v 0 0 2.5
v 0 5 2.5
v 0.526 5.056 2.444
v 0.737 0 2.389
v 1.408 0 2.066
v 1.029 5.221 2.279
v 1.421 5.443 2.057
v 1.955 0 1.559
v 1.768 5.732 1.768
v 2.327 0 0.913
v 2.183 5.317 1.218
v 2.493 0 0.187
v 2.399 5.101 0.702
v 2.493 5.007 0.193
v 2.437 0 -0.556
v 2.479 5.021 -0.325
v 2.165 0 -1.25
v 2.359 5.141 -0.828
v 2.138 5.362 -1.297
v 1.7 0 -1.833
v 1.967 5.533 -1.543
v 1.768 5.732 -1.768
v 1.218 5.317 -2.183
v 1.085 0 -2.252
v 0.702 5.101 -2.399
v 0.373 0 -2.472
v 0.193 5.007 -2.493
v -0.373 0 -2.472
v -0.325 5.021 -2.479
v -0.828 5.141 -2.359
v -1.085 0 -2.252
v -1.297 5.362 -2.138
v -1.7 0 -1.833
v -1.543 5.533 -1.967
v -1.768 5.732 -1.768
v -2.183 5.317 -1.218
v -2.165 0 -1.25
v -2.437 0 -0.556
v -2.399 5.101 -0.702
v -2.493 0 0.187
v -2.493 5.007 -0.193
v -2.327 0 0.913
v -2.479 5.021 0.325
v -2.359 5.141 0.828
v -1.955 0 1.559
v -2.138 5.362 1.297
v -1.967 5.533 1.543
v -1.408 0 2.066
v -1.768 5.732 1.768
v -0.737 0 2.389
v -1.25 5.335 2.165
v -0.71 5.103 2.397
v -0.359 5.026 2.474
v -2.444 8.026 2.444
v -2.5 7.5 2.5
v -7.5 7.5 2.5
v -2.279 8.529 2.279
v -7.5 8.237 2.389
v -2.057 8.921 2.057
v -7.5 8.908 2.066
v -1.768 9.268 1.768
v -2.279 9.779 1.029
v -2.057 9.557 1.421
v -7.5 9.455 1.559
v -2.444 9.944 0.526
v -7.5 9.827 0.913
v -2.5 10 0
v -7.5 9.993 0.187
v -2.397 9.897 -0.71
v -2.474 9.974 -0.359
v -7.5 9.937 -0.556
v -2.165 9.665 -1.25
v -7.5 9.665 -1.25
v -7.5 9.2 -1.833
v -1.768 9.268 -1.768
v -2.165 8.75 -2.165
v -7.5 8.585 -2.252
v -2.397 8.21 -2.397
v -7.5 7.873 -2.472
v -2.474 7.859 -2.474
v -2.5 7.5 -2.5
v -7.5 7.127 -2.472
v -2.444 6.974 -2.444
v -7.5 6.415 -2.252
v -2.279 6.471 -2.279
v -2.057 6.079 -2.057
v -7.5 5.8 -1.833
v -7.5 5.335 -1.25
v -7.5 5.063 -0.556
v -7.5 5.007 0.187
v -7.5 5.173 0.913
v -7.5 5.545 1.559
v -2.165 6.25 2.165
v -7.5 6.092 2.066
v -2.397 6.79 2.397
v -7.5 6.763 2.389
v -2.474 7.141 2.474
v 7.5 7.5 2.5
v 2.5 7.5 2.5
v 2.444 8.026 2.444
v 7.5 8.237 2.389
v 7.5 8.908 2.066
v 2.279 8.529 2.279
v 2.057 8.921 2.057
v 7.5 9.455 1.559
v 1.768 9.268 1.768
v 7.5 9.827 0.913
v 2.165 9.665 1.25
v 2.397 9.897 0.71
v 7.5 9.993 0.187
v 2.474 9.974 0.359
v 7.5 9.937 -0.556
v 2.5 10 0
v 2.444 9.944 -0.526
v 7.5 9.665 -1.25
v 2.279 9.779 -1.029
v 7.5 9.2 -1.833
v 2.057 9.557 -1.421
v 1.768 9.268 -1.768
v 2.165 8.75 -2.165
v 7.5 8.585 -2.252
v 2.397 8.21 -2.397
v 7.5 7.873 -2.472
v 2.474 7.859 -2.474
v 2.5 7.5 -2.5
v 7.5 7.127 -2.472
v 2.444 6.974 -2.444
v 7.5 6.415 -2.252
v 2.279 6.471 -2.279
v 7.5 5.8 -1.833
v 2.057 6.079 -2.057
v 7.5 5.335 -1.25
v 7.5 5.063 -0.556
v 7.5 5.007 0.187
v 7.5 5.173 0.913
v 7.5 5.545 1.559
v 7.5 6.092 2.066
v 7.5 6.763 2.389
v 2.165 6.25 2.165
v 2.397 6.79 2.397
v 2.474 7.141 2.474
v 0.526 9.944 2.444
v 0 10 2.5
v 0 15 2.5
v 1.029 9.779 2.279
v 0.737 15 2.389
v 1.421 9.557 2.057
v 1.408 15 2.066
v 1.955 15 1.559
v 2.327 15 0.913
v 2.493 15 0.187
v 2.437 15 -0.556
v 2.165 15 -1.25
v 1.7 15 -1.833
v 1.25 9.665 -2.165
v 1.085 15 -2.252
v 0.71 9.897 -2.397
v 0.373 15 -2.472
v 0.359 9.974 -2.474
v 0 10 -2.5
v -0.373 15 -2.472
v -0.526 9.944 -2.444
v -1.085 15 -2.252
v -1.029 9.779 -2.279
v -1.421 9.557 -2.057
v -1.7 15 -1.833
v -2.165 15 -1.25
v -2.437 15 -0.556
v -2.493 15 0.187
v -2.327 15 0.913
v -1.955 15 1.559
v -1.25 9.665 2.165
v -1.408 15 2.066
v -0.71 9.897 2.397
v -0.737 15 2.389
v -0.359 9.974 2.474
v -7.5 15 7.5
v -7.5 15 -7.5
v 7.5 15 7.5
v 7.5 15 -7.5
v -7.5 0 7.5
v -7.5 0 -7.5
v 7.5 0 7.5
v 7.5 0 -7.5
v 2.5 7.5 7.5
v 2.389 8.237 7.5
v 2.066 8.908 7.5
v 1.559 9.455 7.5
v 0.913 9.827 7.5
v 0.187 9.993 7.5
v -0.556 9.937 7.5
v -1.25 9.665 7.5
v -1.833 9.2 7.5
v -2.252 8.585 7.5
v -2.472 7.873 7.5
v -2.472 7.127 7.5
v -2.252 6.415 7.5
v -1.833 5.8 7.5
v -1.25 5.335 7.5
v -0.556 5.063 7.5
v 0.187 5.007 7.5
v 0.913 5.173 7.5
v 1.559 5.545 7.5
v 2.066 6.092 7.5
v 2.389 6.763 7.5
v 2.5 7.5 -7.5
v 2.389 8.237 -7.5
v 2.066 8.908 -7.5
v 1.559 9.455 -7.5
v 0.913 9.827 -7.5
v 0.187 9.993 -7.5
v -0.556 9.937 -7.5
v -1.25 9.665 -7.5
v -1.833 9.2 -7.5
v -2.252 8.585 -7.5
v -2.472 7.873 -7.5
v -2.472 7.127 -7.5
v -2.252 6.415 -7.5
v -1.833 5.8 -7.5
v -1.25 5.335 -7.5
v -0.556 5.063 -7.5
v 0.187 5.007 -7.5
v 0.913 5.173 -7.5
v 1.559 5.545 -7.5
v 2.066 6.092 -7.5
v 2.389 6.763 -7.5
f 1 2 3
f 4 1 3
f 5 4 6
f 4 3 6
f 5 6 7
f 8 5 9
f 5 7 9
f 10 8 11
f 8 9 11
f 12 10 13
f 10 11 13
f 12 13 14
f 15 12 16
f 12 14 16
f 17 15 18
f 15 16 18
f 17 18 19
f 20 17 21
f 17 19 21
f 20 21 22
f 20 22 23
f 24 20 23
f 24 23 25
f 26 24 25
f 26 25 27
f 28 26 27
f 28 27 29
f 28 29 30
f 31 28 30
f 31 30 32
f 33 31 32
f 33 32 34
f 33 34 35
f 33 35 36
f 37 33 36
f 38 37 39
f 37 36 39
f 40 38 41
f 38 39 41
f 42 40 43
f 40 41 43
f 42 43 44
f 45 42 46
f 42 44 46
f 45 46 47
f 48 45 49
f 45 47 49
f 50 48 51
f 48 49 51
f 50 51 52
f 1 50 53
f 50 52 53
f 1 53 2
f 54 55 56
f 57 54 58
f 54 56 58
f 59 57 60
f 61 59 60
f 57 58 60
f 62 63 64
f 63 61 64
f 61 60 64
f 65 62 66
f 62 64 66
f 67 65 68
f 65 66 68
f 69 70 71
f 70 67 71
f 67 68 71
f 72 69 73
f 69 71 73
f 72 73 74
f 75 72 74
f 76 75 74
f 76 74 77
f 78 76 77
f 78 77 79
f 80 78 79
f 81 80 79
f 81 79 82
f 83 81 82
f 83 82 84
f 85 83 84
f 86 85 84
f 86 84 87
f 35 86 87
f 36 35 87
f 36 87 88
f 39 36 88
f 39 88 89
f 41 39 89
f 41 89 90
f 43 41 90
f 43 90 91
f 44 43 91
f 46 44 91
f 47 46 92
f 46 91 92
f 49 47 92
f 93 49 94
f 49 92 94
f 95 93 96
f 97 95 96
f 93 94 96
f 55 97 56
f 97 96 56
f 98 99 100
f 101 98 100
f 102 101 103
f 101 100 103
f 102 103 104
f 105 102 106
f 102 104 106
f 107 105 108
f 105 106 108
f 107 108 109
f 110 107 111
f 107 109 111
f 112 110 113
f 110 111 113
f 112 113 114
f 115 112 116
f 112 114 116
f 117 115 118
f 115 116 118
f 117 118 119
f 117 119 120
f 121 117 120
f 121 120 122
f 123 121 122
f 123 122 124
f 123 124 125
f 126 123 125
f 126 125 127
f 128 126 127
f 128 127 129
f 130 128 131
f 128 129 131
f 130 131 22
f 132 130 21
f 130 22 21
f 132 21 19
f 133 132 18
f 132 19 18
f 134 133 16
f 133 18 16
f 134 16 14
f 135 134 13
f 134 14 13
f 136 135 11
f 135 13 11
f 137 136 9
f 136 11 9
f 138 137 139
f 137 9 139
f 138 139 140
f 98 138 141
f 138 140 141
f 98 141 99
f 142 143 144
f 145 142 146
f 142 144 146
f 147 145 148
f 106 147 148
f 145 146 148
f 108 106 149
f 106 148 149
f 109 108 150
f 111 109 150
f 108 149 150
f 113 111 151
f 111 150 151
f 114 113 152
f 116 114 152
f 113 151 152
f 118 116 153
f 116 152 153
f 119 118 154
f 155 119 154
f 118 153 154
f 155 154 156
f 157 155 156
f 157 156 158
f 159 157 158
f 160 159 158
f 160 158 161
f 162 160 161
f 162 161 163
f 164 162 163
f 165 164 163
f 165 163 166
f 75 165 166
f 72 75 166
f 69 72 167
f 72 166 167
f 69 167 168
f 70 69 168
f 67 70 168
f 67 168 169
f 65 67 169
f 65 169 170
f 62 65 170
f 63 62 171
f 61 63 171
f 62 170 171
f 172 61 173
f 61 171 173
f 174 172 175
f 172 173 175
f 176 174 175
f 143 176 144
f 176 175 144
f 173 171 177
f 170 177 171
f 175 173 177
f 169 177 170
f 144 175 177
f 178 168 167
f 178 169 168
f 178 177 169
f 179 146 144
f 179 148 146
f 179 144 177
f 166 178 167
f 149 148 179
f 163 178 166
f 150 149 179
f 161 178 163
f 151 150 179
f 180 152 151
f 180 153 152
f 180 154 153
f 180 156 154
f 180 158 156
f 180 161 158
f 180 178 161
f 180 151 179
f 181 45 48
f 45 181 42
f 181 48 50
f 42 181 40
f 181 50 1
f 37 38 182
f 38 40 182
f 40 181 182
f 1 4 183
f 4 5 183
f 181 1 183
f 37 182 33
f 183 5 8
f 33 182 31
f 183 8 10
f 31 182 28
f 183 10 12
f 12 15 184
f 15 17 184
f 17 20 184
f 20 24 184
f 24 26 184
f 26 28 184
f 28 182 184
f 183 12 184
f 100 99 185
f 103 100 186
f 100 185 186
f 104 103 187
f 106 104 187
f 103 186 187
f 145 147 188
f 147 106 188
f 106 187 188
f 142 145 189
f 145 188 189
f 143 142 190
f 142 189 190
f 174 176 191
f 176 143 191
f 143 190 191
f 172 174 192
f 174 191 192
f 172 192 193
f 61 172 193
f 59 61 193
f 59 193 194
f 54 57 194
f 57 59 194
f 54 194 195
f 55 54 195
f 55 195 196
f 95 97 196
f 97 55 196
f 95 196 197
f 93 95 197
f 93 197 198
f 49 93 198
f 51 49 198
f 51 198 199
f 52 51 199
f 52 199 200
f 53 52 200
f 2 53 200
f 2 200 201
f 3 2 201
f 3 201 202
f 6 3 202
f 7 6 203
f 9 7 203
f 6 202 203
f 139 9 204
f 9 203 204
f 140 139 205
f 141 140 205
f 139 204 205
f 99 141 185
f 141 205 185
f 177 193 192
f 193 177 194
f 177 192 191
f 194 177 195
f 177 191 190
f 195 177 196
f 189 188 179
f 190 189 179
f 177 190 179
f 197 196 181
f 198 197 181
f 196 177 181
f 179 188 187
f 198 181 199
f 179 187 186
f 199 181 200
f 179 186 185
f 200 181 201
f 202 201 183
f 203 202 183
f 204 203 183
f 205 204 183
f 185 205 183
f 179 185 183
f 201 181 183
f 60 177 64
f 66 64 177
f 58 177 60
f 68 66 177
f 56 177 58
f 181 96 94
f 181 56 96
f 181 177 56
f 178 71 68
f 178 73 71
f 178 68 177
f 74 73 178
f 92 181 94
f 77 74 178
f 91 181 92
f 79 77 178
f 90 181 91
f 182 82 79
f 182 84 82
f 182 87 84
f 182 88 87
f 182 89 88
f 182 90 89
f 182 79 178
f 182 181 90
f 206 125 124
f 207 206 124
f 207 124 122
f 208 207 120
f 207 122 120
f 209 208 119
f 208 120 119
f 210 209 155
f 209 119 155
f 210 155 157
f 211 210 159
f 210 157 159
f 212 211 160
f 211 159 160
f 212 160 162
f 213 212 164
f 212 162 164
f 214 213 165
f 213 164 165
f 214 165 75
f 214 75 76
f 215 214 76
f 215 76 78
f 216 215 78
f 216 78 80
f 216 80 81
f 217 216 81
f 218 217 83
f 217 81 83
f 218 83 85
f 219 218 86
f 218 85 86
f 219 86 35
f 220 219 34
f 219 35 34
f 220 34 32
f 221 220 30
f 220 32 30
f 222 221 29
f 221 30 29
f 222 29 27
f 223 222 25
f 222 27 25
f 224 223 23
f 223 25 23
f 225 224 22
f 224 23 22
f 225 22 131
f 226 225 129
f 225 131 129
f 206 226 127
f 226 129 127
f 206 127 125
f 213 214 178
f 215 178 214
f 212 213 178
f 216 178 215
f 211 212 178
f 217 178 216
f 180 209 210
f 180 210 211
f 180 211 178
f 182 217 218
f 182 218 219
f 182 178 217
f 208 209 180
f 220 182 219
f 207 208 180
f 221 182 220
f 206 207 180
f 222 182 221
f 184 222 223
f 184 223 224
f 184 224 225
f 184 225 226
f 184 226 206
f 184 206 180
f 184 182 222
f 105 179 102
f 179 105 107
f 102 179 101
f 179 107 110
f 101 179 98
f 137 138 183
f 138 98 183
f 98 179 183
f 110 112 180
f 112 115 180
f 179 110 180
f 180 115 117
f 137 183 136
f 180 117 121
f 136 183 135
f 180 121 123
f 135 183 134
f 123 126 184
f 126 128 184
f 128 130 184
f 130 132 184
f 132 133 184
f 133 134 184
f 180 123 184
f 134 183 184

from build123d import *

# Parameters (mm, degrees)
SKETCH1_W           = 15
SKETCH1_H           = 15
BOSS_EXTRUDE1_DEPTH = 15
SKETCH3_R           = 2.5
CUT_EXTRUDE1_DEPTH  = 19.371173071
SKETCH4_R           = 2.5
CUT_EXTRUDE2_DEPTH  = 23.5
SKETCH5_R           = 2.5
CUT_EXTRUDE3_DEPTH  = 23.5


with BuildPart() as part:
    # Sketch1 → Boss-Extrude1 (new body)
    with BuildSketch(Plane(origin=(0, 0, 0), x_dir=(1, 0, 0), z_dir=(0, 1, 0))):
        Rectangle(SKETCH1_W, SKETCH1_H)
    extrude(amount=BOSS_EXTRUDE1_DEPTH)

    # Sketch3 → Cut-Extrude1 (cut, through all)
    with BuildSketch(Plane(origin=(0, 15, 0), x_dir=(1, 0, 0), z_dir=(0, 1, 0))):
        with Locations(Location((0, 0, 0), (0, 0, 270))):
            Circle(SKETCH3_R)
    extrude(amount=-CUT_EXTRUDE1_DEPTH, mode=Mode.SUBTRACT)

    # Sketch4 → Cut-Extrude2 (cut, through all)
    with BuildSketch(Plane.ZY.offset(7.5)):
        with Locations((0, 7.5)):
            Circle(SKETCH4_R)
    extrude(amount=-CUT_EXTRUDE2_DEPTH, mode=Mode.SUBTRACT)

    # Sketch5 → Cut-Extrude3 (cut, through all)
    with BuildSketch(Plane.XY.offset(7.5)):
        with Locations((0, 7.5)):
            Circle(SKETCH5_R)
    extrude(amount=-CUT_EXTRUDE3_DEPTH, mode=Mode.SUBTRACT)


solid = part.part
